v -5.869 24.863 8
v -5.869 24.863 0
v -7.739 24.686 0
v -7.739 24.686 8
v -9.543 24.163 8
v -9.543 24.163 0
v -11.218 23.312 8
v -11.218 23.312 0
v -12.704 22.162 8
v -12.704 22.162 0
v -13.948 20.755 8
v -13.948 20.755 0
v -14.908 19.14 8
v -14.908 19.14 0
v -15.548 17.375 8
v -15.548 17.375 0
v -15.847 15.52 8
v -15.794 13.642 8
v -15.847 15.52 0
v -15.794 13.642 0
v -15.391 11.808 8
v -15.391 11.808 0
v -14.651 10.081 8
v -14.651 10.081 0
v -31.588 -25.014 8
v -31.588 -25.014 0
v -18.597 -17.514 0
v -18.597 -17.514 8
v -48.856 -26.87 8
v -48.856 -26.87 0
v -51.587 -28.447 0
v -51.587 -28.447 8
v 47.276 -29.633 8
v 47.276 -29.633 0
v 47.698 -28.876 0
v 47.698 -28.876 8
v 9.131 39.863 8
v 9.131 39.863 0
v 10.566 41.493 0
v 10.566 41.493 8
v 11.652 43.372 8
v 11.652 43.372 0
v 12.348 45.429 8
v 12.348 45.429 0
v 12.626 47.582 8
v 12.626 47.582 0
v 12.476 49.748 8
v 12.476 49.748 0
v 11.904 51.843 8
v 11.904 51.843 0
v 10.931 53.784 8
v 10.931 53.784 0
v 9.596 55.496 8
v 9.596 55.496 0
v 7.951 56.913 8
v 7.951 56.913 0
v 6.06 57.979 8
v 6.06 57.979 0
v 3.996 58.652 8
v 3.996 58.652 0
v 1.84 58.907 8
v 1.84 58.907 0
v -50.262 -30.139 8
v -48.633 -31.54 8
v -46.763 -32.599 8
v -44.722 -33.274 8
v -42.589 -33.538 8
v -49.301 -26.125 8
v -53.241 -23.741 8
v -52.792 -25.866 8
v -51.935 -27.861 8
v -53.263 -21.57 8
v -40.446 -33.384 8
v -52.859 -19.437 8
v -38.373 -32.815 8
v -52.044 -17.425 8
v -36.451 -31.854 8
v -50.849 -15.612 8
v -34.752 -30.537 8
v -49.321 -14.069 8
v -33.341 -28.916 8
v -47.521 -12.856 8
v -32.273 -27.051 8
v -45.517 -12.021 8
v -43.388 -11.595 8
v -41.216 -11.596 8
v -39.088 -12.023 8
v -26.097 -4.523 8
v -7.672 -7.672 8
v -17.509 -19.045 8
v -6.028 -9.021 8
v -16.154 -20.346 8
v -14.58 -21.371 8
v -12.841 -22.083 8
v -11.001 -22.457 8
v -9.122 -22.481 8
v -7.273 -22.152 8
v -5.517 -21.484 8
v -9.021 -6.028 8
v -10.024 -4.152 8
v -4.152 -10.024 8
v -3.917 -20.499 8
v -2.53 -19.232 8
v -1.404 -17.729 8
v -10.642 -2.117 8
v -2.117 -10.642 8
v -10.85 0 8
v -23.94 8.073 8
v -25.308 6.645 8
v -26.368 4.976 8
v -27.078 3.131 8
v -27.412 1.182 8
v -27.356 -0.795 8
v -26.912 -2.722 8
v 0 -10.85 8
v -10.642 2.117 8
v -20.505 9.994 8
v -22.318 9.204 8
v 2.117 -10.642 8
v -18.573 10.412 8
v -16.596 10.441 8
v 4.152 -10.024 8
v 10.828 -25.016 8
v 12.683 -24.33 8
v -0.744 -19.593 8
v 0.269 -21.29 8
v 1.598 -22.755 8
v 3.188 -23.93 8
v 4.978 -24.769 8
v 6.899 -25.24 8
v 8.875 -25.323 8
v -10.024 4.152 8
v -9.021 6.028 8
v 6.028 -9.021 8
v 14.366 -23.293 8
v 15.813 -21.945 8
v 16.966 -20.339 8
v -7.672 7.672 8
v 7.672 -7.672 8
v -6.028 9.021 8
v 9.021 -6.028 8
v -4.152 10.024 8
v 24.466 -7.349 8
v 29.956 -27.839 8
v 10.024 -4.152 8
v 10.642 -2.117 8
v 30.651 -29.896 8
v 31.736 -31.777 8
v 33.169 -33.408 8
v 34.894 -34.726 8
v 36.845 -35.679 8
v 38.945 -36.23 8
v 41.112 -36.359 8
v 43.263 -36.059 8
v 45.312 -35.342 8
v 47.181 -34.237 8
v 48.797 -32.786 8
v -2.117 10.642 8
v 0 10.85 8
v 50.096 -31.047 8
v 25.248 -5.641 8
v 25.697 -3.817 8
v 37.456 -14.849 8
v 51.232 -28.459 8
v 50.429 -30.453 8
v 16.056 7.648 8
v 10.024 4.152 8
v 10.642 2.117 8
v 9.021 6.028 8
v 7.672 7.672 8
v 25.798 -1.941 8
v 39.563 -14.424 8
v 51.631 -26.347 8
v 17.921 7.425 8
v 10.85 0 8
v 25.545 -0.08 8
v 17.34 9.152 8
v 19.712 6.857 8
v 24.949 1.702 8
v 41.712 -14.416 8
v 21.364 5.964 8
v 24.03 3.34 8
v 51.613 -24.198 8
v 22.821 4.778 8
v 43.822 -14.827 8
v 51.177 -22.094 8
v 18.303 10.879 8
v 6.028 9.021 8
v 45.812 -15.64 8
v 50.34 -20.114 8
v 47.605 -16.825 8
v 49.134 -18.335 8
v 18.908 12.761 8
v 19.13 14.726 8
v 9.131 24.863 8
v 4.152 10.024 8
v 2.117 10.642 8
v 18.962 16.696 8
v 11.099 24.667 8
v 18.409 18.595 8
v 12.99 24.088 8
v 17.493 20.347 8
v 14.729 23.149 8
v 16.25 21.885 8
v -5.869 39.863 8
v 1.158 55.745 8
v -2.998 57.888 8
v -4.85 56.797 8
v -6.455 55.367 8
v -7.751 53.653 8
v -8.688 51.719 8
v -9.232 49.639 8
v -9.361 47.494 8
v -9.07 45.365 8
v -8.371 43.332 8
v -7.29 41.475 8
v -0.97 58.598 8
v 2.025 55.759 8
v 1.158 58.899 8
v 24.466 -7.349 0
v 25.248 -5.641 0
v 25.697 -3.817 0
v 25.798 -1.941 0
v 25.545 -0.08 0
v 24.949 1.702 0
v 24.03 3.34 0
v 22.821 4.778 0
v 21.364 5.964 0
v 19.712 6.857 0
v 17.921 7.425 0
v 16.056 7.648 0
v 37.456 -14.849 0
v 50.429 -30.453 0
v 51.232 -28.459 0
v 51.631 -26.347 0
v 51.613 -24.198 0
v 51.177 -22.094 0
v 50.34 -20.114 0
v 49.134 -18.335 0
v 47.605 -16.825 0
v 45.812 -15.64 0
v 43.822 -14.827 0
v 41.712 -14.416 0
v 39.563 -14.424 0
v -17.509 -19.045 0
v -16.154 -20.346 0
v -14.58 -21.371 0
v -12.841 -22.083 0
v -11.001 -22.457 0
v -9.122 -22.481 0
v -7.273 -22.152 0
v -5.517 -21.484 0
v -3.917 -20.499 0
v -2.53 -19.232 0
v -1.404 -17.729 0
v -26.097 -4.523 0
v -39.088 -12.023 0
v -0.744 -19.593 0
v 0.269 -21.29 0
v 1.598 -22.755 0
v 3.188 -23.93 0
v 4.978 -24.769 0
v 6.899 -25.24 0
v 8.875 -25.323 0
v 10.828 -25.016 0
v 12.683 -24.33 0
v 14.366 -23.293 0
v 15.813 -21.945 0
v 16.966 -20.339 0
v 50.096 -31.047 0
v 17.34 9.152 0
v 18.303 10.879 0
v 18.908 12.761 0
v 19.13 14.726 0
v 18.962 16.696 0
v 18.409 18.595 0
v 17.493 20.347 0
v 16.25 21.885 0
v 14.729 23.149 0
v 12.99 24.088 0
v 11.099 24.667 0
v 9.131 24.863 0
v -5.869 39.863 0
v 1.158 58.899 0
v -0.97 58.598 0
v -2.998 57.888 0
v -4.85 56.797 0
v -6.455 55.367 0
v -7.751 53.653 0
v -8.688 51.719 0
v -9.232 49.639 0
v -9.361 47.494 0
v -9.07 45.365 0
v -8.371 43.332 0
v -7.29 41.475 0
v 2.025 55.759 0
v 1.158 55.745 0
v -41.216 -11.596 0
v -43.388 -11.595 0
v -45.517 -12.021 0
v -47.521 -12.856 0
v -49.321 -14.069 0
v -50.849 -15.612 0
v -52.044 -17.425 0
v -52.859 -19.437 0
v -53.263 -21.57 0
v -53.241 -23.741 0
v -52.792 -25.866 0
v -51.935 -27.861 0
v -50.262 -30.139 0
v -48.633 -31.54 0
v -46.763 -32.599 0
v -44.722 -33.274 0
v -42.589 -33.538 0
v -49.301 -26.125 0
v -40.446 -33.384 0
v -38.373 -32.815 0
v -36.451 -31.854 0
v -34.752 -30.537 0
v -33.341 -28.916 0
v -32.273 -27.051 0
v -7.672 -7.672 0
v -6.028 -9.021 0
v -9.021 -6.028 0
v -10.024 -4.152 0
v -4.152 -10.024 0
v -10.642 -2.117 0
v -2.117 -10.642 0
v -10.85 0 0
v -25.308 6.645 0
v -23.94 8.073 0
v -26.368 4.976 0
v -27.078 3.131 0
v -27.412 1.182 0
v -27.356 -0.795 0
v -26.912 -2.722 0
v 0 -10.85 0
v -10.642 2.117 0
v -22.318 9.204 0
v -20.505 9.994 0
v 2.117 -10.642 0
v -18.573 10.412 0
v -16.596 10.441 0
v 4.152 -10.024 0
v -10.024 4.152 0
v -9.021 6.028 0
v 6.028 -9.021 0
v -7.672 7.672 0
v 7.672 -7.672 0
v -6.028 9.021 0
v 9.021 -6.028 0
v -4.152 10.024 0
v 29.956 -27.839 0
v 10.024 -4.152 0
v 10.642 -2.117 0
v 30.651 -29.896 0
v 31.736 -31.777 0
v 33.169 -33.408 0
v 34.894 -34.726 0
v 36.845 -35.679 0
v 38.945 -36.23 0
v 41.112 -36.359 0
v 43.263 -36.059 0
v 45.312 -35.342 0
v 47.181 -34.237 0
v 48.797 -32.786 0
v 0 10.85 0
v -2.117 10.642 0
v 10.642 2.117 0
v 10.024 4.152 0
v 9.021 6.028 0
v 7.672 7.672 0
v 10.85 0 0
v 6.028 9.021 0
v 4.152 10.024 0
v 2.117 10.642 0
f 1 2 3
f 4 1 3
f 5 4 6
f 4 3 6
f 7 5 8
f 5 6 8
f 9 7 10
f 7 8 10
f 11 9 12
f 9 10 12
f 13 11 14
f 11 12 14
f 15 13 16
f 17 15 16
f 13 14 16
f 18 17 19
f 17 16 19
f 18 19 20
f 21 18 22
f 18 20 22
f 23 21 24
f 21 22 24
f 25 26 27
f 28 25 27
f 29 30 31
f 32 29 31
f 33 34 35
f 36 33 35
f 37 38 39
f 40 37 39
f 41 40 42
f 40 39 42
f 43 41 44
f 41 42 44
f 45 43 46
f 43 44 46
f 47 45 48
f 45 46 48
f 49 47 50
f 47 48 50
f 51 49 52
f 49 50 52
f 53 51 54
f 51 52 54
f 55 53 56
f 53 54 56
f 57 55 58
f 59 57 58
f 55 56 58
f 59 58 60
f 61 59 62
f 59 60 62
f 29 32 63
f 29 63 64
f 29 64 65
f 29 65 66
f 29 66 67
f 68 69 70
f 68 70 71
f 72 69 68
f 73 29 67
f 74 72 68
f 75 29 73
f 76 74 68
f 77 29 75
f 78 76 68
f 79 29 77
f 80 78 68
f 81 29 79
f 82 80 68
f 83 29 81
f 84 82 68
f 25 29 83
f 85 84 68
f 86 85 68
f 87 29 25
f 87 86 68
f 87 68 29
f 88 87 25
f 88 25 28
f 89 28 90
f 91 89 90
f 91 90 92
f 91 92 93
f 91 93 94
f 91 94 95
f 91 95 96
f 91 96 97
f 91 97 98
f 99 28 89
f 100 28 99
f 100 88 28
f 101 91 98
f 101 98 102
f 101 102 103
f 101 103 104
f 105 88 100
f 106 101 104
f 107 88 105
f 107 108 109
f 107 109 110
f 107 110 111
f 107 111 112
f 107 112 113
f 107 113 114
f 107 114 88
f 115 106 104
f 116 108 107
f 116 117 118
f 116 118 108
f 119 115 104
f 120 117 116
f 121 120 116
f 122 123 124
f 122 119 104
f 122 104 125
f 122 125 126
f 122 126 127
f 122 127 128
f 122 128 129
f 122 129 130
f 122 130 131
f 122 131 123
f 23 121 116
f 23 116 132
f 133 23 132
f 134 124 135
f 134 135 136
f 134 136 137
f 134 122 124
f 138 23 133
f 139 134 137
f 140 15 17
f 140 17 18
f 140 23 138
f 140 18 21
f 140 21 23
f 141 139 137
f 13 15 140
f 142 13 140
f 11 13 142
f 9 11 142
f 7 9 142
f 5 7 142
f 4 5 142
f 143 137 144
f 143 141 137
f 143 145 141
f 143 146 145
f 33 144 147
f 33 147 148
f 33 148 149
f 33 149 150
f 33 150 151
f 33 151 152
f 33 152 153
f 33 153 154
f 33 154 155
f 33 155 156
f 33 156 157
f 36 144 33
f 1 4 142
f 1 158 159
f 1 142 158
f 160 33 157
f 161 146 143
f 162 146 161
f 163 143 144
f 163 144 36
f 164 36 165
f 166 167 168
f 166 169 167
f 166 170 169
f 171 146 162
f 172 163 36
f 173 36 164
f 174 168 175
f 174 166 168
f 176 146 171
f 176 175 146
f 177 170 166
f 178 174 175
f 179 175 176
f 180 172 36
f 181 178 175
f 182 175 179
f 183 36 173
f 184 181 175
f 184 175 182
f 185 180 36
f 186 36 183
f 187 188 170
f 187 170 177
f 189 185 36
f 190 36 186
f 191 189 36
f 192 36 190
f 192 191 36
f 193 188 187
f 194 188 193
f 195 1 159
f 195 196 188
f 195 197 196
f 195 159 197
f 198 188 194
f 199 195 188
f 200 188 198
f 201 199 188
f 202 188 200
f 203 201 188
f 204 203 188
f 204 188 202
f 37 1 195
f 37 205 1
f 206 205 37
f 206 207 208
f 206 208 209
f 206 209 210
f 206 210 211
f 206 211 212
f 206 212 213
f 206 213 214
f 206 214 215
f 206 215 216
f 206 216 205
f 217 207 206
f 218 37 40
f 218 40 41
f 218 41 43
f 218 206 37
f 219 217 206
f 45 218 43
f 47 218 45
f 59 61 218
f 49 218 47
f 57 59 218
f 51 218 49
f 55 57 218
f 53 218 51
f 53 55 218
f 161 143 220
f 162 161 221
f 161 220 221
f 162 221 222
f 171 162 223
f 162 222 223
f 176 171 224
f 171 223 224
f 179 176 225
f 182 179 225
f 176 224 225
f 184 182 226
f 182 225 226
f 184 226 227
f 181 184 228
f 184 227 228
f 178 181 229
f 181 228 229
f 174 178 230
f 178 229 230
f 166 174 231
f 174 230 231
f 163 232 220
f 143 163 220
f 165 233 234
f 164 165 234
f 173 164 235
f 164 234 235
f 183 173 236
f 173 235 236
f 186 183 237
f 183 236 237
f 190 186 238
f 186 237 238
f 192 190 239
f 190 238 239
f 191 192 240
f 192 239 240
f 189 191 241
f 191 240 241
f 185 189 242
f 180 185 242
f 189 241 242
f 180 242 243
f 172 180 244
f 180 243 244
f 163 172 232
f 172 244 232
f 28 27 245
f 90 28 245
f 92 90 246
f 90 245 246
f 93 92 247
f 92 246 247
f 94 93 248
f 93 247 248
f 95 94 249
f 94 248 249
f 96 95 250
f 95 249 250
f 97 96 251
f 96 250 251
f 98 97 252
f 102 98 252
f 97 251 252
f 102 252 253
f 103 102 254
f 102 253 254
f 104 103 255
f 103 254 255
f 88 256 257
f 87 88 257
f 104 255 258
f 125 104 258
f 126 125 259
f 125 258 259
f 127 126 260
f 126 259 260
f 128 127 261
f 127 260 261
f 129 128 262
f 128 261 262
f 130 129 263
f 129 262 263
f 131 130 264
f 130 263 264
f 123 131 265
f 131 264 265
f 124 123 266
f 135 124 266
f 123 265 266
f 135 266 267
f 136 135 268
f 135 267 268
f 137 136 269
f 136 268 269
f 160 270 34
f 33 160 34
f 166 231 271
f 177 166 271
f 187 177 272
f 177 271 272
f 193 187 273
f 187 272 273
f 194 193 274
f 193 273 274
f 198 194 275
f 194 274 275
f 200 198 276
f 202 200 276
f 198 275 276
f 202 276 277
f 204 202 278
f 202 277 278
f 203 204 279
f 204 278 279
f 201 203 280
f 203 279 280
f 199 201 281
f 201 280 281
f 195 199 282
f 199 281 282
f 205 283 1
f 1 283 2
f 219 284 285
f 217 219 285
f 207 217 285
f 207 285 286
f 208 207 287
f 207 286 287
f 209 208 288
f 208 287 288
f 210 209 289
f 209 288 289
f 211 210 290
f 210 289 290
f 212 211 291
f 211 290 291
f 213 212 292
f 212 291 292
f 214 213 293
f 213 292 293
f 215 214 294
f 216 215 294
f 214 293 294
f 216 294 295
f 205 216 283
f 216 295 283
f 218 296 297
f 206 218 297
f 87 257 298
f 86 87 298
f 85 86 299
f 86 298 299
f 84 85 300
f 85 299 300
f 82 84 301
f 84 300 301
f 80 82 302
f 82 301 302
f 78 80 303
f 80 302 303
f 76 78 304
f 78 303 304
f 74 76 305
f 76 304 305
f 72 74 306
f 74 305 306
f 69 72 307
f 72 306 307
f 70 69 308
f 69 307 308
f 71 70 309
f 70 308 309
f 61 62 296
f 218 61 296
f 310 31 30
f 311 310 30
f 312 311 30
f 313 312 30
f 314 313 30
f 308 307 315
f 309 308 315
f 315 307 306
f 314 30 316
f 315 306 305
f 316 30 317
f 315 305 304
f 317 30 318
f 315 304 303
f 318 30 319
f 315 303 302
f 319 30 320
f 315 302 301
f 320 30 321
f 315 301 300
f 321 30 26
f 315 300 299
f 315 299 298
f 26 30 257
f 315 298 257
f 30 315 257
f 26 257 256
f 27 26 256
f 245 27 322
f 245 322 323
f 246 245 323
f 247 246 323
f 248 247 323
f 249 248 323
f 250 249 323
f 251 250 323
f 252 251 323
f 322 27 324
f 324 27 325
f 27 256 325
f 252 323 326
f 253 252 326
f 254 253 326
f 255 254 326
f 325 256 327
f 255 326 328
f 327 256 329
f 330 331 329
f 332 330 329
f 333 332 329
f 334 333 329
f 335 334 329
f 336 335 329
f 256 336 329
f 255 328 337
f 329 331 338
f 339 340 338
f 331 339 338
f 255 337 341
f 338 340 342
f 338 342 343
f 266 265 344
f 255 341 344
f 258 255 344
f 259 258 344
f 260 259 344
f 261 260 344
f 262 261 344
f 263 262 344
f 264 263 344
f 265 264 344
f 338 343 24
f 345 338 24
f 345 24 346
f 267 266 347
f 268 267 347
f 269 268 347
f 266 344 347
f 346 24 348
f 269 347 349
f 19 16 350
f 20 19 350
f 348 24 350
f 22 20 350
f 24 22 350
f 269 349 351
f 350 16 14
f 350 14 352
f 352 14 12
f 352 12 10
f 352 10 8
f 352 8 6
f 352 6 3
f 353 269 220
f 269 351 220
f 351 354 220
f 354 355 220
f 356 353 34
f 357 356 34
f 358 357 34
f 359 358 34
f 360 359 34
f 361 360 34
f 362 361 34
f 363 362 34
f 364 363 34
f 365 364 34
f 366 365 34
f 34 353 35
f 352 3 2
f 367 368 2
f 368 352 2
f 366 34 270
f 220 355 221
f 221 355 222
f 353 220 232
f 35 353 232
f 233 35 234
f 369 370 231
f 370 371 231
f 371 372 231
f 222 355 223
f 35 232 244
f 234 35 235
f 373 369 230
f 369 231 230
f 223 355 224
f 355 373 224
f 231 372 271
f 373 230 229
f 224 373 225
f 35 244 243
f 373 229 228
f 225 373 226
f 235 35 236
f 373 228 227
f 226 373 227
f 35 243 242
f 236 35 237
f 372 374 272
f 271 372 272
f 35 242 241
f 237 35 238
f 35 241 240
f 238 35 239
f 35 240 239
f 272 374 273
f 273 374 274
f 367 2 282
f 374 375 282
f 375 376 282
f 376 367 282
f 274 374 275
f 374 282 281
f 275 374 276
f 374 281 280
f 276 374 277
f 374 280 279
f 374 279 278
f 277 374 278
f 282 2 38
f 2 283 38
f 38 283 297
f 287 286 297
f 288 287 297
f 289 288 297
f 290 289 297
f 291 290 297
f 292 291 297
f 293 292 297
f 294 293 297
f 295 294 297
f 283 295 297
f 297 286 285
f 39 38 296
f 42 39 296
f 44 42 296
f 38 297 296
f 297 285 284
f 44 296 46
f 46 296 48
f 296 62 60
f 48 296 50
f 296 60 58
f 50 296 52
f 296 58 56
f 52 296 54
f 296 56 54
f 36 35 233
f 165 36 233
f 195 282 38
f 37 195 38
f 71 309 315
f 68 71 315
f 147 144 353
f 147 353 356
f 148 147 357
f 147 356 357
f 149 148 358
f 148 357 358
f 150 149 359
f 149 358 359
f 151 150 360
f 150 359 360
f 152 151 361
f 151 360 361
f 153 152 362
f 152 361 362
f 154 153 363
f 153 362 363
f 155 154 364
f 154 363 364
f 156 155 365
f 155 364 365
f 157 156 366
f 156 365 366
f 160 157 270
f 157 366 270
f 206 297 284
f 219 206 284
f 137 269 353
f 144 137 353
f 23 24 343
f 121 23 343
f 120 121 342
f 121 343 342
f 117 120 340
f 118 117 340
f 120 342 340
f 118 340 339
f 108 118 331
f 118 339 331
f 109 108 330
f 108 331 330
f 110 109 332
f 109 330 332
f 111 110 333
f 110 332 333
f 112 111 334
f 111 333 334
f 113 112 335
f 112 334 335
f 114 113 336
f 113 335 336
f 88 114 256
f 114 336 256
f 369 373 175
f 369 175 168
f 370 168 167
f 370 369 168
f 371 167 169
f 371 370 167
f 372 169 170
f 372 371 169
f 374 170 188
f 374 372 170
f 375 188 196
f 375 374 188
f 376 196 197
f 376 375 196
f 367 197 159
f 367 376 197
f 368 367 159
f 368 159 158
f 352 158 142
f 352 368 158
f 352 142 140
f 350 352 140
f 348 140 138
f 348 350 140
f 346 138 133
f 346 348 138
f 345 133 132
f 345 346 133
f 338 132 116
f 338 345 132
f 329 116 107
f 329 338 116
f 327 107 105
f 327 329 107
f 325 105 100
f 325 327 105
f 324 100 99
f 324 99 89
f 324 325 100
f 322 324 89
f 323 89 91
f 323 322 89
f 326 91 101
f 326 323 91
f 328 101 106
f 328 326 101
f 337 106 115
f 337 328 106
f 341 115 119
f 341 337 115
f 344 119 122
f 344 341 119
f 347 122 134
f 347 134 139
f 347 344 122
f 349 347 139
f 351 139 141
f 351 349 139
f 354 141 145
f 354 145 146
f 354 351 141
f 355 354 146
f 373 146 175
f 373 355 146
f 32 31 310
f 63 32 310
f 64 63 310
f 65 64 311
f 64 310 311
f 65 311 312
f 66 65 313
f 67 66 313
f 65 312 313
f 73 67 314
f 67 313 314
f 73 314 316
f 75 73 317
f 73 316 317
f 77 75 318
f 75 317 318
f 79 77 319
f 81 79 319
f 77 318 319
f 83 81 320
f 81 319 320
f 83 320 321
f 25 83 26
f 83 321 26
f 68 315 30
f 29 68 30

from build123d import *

# Parameters (mm, degrees)
F0_R     = 10.85
F1_DEPTH = 8


with BuildPart() as f1:
    # F0 (on Top) → F1 (new body)
    with BuildSketch(Plane.XY):
        with BuildLine():
            Line((9.131195, 24.862669), (9.131195, 39.862669))
            ThreePointArc((9.131195, 39.862669), (11.903994, 51.842548), (1.839538, 58.907434))
            Line((1.839538, 58.907434), (2.025343, 55.758941))
            Line((2.025343, 55.758941), (1.158253, 55.745472))
            Line((1.158253, 55.745472), (1.158253, 58.899236))
            ThreePointArc((1.158253, 58.899236), (-8.688188, 51.71865), (-5.868805, 39.862669))
            Line((-5.868805, 39.862669), (-5.868805, 24.862669))
            ThreePointArc((-5.868805, 24.862669), (-14.4659, 19.970502), (-14.65131, 10.080661))
            ThreePointArc((-14.65131, 10.080661), (-25.307738, 6.64516), (-26.0973, -4.523488))
            Line((-26.0973, -4.523488), (-39.087681, -12.023488))
            ThreePointArc((-39.087681, -12.023488), (-50.84896, -15.612113), (-51.935103, -27.860631))
            Line((-51.935103, -27.860631), (-49.301331, -26.125472))
            Line((-49.301331, -26.125472), (-48.856122, -26.86966))
            Line((-48.856122, -26.86966), (-51.587361, -28.446542))
            ThreePointArc((-51.587361, -28.446542), (-40.445571, -33.383517), (-31.587681, -25.013869))
            Line((-31.587681, -25.013869), (-18.5973, -17.513869))
            ThreePointArc((-18.5973, -17.513869), (-10.062012, -22.513088), (-1.404453, -17.728738))
            ThreePointArc((-1.404453, -17.728738), (6.898991, -25.239724), (16.966106, -20.339181))
            Line((16.966106, -20.339181), (29.956487, -27.839181))
            ThreePointArc((29.956487, -27.839181), (38.944966, -36.230435), (50.095566, -31.046804))
            Line((50.095566, -31.046804), (47.275988, -29.633469))
            Line((47.275988, -29.633469), (47.697869, -28.875812))
            Line((47.697869, -28.875812), (50.429108, -30.452694))
            ThreePointArc((50.429108, -30.452694), (49.133759, -18.335133), (37.456487, -14.8488))
            Line((37.456487, -14.8488), (24.466106, -7.3488))
            ThreePointArc((24.466106, -7.3488), (24.527912, 2.542586), (16.055764, 7.648077))
            ThreePointArc((16.055764, 7.648077), (18.408746, 18.594564), (9.131195, 24.862669))
        make_face()
        Circle(F0_R, mode=Mode.SUBTRACT)
    extrude(amount=F1_DEPTH)


solid = f1.part
